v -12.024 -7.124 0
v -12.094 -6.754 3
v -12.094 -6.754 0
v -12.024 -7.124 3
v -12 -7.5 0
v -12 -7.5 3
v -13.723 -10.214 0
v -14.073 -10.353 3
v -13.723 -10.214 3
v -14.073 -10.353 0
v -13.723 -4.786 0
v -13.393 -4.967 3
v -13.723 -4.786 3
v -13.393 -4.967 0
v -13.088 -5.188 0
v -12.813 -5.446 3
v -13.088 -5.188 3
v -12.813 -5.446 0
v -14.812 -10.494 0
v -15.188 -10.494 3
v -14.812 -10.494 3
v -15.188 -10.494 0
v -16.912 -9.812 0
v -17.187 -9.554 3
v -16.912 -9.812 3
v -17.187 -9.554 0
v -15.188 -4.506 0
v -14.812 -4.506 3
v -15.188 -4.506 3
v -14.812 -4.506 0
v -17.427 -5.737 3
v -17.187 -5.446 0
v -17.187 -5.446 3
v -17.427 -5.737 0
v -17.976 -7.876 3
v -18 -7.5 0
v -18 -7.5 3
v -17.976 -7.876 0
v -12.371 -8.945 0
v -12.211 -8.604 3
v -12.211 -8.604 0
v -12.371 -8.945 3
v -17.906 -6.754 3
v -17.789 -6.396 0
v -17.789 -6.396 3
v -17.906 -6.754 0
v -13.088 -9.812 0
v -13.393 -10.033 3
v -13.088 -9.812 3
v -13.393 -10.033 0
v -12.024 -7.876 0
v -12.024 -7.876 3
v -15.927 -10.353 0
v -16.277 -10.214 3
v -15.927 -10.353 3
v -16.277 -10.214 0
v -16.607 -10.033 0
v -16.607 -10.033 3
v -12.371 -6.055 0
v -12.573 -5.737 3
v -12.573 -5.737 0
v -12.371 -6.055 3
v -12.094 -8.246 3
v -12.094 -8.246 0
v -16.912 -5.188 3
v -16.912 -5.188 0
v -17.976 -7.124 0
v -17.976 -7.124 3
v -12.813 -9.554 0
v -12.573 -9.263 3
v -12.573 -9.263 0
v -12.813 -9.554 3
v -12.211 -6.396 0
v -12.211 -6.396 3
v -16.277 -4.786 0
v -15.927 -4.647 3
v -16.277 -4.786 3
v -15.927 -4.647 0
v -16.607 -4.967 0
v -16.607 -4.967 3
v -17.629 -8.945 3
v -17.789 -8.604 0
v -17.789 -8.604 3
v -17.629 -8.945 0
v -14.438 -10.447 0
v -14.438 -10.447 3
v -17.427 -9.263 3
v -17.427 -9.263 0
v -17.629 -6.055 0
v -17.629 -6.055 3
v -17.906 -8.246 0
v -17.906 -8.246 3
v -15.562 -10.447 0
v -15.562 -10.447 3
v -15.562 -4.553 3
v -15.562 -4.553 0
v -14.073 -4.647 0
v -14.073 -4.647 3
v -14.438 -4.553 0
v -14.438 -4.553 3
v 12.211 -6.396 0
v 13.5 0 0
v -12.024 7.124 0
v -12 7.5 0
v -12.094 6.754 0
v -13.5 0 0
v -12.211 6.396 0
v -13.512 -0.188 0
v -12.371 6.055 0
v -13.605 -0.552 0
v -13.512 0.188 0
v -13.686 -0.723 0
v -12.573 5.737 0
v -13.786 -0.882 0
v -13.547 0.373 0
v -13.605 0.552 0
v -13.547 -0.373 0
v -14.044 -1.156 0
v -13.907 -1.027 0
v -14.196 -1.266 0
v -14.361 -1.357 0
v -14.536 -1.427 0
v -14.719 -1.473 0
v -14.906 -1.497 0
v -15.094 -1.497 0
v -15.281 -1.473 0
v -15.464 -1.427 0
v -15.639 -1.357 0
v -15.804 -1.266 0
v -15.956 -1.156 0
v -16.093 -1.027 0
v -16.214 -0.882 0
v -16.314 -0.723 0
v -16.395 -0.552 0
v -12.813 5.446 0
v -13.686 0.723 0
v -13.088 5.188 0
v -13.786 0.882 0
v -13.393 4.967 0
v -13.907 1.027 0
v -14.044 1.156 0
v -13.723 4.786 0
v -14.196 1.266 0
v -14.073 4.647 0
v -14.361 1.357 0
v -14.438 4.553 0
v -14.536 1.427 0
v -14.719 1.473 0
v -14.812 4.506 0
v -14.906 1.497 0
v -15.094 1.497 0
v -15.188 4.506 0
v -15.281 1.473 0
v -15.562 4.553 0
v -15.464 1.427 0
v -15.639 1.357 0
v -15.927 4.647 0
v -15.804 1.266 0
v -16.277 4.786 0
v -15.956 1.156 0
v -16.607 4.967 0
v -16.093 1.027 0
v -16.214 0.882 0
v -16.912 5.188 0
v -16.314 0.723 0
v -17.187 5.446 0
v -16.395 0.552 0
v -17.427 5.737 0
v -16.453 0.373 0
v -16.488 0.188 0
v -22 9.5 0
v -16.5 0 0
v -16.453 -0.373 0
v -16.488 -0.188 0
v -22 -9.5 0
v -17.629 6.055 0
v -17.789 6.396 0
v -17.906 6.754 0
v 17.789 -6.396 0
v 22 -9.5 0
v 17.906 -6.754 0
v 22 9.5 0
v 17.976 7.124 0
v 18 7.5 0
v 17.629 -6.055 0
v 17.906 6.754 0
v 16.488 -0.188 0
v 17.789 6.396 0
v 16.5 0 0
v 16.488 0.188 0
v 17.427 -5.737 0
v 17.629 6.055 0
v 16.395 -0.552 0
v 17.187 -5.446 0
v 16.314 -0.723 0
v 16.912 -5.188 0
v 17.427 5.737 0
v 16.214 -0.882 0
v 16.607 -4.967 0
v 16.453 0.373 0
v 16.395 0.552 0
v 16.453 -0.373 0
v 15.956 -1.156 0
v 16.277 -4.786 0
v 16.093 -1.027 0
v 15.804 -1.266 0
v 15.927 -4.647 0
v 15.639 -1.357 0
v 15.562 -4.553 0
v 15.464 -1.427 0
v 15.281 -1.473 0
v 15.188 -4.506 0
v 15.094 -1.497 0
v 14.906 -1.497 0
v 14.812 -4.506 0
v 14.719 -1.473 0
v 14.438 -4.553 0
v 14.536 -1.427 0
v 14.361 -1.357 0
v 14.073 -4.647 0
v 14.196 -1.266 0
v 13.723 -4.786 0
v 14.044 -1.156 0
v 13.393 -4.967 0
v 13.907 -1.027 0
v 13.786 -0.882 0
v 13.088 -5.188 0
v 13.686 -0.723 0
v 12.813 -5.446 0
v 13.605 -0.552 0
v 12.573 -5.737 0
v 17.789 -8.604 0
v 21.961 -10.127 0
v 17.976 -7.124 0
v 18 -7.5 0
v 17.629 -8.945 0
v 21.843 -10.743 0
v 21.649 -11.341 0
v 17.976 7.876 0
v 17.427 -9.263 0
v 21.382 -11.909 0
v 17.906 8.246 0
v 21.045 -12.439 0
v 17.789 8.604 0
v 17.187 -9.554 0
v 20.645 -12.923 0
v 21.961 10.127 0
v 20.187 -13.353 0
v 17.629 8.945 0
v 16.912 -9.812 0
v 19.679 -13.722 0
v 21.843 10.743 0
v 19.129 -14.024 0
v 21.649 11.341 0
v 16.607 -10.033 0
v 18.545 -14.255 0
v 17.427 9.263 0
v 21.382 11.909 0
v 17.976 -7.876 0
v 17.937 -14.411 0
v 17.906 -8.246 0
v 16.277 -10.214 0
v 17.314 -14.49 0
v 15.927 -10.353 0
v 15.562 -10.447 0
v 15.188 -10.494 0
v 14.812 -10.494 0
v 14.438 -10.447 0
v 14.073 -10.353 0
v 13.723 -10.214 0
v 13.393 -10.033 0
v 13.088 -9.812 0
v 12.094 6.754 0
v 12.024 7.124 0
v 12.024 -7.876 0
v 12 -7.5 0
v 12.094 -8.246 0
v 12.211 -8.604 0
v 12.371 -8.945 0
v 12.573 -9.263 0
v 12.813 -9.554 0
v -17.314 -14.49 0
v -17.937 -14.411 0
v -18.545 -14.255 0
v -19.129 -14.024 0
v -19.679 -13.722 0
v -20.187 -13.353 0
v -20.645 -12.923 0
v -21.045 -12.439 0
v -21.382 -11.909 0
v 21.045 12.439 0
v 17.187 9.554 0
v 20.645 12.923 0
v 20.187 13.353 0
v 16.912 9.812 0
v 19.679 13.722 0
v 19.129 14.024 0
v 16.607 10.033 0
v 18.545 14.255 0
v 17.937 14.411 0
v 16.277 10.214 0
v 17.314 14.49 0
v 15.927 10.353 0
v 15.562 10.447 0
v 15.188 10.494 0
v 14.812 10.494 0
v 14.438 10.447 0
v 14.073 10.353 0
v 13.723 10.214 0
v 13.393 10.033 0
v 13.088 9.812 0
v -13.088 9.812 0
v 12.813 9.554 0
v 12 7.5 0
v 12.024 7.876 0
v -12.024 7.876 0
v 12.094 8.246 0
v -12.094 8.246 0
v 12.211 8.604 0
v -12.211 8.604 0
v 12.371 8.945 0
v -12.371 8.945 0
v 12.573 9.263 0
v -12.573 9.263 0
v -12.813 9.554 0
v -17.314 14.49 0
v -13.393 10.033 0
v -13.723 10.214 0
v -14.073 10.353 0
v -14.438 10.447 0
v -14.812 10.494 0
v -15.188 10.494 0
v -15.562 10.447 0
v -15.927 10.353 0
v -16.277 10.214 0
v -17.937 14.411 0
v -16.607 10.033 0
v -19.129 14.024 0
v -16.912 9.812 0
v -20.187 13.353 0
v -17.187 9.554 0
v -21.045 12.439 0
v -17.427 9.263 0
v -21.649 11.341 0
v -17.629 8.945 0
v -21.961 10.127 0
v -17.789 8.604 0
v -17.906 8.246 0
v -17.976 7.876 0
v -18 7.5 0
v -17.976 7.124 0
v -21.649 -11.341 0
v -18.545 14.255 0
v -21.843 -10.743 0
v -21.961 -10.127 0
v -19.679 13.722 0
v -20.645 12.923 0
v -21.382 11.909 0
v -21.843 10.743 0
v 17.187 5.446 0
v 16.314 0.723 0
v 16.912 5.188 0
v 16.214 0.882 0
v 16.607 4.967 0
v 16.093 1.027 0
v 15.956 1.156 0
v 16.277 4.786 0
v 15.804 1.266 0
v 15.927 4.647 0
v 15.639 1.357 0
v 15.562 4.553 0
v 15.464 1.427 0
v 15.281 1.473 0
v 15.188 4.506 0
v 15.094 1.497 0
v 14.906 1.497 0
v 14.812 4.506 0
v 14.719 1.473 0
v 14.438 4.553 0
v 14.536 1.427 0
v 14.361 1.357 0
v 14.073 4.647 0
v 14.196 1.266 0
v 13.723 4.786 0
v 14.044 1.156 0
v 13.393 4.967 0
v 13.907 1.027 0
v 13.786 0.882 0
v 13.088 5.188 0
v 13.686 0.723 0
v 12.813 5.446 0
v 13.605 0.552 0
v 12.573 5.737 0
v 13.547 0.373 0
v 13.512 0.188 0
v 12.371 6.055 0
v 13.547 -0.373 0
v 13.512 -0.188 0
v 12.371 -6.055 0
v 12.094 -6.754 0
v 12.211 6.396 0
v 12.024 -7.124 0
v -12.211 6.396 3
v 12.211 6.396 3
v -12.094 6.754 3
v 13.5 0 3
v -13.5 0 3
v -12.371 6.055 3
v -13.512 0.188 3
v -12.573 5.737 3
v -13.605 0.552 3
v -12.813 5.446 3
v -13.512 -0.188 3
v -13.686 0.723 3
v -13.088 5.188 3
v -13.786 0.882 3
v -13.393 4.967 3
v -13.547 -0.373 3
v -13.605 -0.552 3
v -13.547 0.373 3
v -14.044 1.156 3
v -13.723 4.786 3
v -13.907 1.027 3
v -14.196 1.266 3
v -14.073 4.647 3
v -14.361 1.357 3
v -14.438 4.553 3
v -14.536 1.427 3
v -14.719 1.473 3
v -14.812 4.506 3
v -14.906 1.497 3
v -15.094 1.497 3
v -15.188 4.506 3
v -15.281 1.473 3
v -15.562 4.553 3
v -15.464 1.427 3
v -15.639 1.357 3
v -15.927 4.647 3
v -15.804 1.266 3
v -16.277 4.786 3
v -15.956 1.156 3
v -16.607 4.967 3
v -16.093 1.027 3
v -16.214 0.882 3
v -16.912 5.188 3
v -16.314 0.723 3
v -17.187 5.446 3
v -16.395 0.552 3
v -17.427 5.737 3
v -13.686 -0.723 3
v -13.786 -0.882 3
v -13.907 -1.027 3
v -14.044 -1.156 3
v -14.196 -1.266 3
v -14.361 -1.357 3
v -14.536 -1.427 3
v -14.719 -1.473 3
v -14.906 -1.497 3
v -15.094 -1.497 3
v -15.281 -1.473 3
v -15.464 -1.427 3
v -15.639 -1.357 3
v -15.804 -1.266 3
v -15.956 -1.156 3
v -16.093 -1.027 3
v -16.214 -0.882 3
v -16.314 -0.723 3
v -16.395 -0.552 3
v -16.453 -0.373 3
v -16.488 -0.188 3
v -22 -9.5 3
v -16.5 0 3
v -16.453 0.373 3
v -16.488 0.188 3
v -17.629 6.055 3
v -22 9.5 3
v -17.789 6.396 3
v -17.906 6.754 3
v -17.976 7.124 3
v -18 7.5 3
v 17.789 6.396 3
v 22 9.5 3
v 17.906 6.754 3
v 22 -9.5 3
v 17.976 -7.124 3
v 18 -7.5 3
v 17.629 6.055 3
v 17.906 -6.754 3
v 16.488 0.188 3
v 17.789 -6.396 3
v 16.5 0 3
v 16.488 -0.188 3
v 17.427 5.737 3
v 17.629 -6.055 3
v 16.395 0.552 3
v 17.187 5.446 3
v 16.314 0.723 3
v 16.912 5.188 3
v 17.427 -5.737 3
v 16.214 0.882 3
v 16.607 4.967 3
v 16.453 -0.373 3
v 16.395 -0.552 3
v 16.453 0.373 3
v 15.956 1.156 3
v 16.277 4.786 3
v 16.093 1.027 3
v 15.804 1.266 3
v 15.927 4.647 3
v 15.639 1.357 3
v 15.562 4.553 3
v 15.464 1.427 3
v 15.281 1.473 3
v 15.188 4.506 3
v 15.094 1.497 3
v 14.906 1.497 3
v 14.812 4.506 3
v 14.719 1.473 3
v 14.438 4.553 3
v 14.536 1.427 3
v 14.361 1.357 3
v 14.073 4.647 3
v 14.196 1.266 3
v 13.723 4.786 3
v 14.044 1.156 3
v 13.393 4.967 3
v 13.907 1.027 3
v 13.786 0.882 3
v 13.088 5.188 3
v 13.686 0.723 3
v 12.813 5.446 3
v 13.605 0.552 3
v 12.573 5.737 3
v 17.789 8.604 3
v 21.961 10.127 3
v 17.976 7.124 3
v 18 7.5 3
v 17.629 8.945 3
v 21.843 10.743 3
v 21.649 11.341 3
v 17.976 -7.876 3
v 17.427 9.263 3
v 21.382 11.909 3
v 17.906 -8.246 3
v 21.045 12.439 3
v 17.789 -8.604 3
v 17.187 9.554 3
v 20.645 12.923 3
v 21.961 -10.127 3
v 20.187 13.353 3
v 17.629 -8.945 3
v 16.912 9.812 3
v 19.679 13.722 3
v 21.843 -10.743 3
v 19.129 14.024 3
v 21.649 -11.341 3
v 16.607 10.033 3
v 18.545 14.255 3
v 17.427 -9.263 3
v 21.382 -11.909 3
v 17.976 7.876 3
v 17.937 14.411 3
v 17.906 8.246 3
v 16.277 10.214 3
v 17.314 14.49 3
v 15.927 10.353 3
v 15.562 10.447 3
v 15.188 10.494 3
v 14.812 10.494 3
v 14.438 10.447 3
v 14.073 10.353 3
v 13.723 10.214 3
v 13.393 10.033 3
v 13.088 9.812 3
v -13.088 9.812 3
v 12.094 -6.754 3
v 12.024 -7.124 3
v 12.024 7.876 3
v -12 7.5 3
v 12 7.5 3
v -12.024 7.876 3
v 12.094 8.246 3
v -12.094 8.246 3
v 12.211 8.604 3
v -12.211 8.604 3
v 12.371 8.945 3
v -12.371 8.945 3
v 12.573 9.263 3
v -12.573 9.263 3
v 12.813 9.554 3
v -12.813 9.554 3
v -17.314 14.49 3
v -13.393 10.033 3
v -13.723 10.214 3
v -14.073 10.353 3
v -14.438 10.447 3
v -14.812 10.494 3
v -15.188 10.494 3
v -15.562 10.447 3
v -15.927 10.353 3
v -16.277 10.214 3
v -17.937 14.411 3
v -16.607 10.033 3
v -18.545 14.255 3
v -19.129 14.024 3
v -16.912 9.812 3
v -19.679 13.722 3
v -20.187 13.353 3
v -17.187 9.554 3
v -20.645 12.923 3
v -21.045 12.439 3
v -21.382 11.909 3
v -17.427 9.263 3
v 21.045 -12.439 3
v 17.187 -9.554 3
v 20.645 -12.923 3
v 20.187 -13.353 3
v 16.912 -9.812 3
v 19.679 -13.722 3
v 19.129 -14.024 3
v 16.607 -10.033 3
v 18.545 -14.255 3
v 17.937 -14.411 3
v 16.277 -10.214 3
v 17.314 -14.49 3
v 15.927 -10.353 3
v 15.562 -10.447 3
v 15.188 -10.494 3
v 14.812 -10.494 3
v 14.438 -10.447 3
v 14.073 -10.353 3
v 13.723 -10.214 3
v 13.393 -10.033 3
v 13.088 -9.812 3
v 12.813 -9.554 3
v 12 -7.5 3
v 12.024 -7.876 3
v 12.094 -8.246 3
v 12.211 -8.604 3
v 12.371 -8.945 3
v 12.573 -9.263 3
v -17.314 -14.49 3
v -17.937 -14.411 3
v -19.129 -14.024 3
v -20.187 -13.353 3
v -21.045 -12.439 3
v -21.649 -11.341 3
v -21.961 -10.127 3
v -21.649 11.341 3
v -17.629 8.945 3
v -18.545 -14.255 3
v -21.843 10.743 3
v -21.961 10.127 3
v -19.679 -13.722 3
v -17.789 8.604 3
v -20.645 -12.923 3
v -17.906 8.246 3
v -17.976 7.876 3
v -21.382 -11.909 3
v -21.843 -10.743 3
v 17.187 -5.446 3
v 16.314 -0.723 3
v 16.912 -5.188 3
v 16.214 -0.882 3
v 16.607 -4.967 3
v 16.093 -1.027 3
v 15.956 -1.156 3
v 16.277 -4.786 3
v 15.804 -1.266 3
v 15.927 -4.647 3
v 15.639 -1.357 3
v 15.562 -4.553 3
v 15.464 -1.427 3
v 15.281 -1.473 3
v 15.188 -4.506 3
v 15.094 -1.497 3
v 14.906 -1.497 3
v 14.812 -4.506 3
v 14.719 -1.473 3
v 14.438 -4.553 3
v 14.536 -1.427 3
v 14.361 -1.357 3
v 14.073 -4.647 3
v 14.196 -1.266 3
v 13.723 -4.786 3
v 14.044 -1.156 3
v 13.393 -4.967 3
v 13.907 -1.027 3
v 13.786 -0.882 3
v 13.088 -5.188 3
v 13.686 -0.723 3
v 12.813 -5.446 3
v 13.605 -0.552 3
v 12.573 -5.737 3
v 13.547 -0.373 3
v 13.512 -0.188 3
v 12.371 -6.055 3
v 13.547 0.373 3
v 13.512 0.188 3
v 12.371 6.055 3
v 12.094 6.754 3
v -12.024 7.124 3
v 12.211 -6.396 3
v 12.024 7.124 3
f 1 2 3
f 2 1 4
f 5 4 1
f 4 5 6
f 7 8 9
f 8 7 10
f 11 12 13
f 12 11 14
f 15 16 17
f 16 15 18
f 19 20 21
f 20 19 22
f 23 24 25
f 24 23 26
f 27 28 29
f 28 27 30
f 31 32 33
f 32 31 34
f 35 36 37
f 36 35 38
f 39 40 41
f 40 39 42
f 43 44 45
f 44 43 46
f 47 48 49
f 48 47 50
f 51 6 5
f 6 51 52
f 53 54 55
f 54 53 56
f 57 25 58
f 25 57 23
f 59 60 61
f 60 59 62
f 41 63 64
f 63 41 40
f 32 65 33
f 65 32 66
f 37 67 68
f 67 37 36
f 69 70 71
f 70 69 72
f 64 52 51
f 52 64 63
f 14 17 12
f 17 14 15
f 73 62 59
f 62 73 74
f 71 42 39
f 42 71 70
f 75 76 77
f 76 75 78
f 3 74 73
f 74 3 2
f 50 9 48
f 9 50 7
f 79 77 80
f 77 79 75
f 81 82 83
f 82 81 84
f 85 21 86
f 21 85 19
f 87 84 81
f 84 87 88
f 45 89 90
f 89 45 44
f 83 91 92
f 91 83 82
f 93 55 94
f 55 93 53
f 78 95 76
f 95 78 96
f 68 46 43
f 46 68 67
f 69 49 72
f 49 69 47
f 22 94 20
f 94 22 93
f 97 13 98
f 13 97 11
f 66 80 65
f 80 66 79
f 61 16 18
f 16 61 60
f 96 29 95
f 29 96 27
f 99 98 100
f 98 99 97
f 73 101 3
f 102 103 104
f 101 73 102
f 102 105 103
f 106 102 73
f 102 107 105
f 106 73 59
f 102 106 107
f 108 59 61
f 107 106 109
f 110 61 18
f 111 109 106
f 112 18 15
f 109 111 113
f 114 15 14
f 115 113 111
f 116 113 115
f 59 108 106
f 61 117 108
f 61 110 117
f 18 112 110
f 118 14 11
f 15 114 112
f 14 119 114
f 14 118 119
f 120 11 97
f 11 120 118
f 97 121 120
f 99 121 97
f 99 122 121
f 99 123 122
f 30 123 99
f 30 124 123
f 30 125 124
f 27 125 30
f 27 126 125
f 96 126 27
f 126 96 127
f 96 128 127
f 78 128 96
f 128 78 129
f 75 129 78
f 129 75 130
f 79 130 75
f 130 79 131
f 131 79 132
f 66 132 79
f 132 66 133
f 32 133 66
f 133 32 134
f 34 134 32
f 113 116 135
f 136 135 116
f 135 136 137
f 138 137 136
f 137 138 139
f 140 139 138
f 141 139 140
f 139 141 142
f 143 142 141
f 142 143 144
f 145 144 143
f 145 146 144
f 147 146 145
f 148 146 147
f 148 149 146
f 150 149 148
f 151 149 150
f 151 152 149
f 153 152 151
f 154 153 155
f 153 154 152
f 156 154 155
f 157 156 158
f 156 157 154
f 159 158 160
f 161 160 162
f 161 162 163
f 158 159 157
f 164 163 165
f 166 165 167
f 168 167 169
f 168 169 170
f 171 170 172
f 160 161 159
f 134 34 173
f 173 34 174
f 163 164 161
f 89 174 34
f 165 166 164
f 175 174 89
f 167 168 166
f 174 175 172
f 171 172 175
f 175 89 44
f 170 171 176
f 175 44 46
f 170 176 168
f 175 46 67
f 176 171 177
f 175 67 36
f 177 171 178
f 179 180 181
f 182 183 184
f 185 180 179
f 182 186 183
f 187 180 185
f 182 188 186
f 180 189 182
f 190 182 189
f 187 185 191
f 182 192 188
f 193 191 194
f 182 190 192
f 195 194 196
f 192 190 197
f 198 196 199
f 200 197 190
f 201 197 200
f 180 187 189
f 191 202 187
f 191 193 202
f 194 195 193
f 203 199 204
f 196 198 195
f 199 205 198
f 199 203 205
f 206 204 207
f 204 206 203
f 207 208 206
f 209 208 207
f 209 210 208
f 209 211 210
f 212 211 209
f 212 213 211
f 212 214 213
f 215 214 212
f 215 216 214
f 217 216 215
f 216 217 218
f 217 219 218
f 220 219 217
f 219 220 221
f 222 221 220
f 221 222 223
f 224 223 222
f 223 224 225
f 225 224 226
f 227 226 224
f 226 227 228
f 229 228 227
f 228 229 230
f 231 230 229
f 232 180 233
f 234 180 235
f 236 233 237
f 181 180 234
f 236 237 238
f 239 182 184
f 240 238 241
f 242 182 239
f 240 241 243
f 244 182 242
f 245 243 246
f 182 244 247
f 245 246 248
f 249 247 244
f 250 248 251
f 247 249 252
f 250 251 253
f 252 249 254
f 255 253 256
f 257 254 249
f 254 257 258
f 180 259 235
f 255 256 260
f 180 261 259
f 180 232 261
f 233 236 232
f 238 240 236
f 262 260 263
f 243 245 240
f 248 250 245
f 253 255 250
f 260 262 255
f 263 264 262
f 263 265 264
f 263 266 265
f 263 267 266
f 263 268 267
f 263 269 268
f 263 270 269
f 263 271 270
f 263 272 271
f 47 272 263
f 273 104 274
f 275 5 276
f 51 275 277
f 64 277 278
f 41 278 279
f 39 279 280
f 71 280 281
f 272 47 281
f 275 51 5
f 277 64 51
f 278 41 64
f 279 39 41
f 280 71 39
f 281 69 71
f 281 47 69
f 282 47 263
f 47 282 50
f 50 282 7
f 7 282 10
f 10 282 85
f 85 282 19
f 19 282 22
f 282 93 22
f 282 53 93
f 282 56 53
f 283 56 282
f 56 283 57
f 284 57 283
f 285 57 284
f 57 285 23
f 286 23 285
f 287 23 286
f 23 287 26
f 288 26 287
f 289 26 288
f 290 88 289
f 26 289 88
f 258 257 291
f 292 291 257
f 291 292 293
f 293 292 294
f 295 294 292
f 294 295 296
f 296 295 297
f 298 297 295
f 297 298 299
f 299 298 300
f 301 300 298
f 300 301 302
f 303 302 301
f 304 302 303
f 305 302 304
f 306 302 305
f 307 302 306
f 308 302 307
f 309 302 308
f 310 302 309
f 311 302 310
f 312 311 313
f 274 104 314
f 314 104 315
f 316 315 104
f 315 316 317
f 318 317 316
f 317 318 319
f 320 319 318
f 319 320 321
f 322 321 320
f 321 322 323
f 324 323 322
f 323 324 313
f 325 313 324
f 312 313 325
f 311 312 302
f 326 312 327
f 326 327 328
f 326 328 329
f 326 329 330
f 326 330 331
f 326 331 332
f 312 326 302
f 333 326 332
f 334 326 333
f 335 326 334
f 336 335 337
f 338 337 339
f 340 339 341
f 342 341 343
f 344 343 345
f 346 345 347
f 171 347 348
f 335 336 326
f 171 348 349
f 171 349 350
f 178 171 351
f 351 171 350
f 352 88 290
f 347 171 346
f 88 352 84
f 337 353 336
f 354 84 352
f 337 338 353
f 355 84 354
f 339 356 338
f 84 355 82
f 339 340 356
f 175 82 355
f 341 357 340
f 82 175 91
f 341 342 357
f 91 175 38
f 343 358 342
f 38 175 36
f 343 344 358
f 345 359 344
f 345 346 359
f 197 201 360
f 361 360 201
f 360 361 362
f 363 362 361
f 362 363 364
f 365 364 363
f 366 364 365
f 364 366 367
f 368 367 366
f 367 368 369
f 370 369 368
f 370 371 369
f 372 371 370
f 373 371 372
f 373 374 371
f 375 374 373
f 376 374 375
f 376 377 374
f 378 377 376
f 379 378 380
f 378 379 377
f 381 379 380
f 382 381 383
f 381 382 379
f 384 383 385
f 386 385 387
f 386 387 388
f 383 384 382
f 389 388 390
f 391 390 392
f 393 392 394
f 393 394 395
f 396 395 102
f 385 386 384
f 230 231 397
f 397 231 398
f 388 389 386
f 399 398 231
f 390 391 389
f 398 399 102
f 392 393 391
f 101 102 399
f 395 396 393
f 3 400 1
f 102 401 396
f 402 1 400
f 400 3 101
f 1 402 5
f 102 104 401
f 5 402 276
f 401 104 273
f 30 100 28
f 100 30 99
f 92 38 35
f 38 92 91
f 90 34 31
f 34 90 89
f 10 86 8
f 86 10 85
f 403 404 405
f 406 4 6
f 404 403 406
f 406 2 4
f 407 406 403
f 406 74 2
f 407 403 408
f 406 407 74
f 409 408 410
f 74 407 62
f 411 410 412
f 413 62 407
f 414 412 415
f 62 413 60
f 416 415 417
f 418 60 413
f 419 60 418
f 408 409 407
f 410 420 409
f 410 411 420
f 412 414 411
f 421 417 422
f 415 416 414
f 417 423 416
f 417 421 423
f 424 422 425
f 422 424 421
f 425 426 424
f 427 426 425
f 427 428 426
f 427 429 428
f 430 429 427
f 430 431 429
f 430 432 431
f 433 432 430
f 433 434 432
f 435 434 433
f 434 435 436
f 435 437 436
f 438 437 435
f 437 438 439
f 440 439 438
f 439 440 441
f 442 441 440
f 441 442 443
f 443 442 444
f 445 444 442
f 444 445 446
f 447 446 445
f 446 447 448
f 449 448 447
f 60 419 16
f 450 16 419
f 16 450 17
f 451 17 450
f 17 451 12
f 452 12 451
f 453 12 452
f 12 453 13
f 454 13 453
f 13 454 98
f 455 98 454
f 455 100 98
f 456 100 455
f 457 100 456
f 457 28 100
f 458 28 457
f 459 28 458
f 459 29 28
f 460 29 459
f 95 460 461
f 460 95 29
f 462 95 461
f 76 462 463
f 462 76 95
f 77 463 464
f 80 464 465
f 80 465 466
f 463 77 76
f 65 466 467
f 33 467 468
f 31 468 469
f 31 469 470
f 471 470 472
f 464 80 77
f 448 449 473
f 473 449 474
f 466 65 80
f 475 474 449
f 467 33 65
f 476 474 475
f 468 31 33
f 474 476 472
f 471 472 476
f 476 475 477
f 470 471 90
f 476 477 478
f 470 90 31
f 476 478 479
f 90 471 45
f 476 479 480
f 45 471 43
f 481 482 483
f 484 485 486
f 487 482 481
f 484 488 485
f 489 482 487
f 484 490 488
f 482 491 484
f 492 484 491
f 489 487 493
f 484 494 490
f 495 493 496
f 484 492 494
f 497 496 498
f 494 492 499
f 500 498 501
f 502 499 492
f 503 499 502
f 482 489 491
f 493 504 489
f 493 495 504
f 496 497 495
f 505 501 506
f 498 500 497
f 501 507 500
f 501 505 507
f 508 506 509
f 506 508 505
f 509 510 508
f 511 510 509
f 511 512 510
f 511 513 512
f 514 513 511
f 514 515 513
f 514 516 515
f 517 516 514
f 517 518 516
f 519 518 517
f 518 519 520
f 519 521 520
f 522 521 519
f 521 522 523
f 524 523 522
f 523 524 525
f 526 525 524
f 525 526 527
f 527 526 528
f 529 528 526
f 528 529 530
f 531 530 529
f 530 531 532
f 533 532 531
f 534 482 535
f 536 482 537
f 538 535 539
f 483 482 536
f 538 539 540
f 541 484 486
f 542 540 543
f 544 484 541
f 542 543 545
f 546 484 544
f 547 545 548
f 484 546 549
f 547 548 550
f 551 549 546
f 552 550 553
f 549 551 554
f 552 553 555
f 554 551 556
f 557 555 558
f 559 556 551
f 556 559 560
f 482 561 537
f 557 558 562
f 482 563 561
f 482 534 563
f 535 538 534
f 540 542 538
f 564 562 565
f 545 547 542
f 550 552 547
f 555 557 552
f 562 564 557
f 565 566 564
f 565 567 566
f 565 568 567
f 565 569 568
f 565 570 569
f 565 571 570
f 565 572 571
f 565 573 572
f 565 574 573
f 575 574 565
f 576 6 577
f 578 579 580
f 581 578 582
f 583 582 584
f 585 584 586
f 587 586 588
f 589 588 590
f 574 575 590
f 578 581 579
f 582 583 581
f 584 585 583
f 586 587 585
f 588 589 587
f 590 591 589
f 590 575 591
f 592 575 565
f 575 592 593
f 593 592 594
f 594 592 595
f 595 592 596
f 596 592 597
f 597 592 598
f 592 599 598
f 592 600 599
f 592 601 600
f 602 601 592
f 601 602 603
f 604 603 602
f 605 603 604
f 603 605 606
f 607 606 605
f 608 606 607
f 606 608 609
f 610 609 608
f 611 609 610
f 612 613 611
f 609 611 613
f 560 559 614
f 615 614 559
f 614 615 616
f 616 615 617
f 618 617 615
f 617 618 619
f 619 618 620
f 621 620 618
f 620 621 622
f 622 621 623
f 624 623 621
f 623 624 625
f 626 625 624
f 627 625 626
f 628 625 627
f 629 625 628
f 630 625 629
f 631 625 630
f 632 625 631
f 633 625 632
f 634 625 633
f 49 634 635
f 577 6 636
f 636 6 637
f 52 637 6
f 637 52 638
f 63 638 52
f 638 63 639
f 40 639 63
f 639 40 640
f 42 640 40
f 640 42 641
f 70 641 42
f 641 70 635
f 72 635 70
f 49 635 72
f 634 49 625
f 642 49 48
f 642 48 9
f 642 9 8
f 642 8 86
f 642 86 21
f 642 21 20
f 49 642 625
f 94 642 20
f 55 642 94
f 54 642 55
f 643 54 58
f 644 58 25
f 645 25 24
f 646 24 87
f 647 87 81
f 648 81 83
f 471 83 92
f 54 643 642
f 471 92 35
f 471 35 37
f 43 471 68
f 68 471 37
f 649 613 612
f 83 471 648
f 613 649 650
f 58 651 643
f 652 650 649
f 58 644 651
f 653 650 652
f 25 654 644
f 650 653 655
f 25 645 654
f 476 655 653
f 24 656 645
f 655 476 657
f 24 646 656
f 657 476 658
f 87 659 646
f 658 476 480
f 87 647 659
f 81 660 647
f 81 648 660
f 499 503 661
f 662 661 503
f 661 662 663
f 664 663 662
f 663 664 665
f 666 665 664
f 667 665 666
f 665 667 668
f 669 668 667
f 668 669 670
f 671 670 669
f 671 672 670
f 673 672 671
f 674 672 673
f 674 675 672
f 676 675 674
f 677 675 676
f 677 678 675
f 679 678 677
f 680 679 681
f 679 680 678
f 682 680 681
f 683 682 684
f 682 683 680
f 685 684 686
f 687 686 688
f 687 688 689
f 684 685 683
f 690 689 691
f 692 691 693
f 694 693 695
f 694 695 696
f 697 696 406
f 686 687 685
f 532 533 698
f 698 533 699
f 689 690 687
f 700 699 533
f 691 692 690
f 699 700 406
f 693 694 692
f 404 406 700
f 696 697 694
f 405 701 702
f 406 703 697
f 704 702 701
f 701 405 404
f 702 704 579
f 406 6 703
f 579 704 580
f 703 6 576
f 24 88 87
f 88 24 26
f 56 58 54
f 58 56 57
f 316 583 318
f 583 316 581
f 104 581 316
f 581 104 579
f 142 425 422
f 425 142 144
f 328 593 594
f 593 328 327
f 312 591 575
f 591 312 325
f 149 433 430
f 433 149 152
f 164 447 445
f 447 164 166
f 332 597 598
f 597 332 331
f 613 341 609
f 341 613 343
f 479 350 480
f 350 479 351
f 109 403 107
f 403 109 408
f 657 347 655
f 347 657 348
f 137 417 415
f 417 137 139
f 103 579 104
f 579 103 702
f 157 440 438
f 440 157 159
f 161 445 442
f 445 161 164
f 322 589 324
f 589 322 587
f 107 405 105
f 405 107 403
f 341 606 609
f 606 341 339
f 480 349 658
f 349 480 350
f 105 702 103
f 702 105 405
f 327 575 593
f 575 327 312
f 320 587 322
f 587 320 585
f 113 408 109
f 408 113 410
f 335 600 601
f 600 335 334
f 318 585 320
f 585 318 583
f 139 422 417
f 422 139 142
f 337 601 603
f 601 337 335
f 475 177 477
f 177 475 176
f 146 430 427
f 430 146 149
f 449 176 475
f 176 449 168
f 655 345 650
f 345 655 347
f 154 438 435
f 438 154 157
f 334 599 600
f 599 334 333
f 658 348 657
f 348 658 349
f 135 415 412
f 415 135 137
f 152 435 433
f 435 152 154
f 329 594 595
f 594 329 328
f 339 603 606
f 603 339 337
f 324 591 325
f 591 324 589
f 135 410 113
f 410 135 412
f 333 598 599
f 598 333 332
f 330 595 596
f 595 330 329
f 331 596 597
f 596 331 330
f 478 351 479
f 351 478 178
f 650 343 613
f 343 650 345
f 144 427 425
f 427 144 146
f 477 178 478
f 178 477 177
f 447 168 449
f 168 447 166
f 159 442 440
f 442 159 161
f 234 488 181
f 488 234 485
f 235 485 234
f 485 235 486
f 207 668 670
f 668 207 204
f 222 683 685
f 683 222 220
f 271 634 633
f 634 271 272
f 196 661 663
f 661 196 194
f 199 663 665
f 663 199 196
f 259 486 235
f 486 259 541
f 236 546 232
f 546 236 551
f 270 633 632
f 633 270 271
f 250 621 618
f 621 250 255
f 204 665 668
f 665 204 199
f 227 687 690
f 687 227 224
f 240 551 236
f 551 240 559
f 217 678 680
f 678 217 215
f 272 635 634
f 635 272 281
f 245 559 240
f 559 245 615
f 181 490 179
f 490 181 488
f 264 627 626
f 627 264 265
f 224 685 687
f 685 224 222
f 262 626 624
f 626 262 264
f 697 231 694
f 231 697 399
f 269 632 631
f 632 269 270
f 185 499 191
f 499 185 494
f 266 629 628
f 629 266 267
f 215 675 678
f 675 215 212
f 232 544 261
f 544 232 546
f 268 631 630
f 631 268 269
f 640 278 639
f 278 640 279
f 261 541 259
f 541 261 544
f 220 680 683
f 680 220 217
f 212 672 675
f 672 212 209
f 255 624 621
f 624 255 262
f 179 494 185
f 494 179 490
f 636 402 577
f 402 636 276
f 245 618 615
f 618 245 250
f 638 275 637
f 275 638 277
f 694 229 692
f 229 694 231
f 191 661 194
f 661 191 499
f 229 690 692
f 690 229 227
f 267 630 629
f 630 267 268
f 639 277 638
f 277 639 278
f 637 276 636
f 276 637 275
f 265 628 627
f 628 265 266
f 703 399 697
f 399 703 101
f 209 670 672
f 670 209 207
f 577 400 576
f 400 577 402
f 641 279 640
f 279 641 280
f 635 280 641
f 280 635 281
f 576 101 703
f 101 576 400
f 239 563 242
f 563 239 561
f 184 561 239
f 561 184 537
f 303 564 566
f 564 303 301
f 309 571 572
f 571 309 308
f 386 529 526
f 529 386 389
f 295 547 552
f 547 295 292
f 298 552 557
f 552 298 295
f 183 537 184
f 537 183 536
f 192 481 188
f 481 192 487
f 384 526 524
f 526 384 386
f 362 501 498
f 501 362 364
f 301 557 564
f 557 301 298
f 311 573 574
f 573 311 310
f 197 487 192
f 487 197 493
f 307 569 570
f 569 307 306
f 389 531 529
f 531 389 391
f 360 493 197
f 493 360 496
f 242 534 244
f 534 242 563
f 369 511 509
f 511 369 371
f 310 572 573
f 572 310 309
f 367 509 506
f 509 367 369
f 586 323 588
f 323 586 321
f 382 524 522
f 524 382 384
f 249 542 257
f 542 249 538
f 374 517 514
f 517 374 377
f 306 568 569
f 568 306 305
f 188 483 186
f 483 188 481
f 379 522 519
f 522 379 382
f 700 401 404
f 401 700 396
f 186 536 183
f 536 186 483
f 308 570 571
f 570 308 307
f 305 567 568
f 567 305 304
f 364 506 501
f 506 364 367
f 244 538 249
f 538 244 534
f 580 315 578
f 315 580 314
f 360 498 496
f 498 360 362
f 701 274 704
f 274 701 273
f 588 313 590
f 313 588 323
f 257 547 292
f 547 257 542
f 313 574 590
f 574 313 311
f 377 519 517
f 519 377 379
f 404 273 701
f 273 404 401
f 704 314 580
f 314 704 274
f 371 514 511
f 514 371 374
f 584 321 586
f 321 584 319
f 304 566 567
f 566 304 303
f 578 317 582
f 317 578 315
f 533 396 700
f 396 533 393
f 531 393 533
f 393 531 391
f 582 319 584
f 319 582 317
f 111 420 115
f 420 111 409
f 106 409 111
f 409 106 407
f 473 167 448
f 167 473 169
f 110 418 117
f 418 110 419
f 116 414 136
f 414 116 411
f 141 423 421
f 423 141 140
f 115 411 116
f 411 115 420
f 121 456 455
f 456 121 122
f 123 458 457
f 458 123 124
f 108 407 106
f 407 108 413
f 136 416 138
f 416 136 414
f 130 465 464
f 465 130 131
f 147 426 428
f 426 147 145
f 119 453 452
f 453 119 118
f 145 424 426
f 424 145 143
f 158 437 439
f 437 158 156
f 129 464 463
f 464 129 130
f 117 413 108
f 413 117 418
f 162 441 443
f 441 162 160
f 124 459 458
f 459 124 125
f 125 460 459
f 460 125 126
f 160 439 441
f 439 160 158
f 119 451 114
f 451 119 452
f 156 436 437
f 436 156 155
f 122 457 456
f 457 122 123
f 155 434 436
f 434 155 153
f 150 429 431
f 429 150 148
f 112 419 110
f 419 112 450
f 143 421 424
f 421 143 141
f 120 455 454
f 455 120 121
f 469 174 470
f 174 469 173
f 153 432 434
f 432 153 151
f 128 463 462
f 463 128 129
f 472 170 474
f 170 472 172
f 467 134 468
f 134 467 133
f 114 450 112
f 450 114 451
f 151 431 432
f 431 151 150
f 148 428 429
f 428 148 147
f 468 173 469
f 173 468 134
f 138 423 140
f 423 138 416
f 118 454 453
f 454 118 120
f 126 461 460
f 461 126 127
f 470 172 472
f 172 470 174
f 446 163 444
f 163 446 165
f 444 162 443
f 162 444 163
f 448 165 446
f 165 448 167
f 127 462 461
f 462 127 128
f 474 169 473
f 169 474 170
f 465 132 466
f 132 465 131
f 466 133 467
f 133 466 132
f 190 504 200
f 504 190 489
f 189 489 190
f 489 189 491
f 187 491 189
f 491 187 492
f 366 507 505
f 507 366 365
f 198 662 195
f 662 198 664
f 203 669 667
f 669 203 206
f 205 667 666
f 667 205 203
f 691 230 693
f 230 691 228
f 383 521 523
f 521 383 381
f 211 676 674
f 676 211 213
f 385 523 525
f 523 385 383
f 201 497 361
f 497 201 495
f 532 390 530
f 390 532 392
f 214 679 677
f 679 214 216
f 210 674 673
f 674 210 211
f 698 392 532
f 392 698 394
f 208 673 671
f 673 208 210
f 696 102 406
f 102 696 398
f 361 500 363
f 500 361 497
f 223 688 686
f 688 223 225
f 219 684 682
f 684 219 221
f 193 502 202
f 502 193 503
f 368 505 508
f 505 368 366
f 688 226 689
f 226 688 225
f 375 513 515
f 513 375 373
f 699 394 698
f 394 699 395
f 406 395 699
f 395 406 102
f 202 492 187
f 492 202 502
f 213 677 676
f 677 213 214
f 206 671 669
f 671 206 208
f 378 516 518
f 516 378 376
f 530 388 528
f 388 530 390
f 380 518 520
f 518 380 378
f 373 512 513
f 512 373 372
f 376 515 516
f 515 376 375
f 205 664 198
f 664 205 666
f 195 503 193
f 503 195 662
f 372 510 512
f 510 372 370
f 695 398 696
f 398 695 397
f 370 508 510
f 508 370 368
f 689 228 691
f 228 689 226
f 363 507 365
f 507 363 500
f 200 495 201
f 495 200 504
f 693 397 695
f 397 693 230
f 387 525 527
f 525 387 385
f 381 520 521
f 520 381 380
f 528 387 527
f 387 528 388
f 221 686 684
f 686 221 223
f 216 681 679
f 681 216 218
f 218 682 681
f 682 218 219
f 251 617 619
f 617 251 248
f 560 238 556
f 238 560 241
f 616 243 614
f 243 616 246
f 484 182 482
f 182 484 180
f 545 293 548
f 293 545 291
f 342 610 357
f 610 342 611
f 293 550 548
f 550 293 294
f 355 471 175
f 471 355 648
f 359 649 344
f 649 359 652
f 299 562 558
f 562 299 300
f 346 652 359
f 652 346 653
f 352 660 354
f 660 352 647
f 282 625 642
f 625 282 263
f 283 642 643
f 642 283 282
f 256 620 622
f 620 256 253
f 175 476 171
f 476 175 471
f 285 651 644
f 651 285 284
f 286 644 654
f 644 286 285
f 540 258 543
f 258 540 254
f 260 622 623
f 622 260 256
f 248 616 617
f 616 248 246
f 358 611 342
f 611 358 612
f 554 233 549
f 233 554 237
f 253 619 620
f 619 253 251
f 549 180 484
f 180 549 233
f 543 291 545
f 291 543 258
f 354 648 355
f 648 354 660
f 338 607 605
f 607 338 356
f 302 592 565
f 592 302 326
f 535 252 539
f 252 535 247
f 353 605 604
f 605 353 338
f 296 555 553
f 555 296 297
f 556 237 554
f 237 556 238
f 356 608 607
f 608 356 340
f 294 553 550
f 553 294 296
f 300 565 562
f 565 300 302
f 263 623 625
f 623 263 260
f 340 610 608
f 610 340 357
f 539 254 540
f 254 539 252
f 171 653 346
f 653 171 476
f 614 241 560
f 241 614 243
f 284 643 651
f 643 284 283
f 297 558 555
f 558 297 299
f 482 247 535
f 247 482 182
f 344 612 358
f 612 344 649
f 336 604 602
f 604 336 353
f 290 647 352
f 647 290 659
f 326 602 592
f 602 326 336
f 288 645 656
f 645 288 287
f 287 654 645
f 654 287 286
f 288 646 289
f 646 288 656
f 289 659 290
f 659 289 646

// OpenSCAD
$fn = 50;


difference() {
	union() {
		hull() {
			translate(v = [-17.0000000000, 9.5000000000, 0]) {
				cylinder(h = 3, r = 5);
			}
			translate(v = [17.0000000000, 9.5000000000, 0]) {
				cylinder(h = 3, r = 5);
			}
			translate(v = [-17.0000000000, -9.5000000000, 0]) {
				cylinder(h = 3, r = 5);
			}
			translate(v = [17.0000000000, -9.5000000000, 0]) {
				cylinder(h = 3, r = 5);
			}
		}
	}
	union() {
		translate(v = [-15.0000000000, -7.5000000000, 0]) {
			cylinder(h = 3, r = 3.0000000000);
		}
		translate(v = [-15.0000000000, 7.5000000000, 0]) {
			cylinder(h = 3, r = 3.0000000000);
		}
		translate(v = [15.0000000000, -7.5000000000, 0]) {
			cylinder(h = 3, r = 3.0000000000);
		}
		translate(v = [15.0000000000, 7.5000000000, 0]) {
			cylinder(h = 3, r = 3.0000000000);
		}
		translate(v = [-15.0000000000, -7.5000000000, 0]) {
			cylinder(h = 3, r = 1.5000000000);
		}
		translate(v = [-15.0000000000, 0.0000000000, 0]) {
			cylinder(h = 3, r = 1.5000000000);
		}
		translate(v = [-15.0000000000, 7.5000000000, 0]) {
			cylinder(h = 3, r = 1.5000000000);
		}
		translate(v = [15.0000000000, -7.5000000000, 0]) {
			cylinder(h = 3, r = 1.5000000000);
		}
		translate(v = [15.0000000000, 0.0000000000, 0]) {
			cylinder(h = 3, r = 1.5000000000);
		}
		translate(v = [15.0000000000, 7.5000000000, 0]) {
			cylinder(h = 3, r = 1.5000000000);
		}
		translate(v = [-15.0000000000, -7.5000000000, 0]) {
			cylinder(h = 3, r = 1.5000000000);
		}
		translate(v = [-15.0000000000, 0.0000000000, 0]) {
			cylinder(h = 3, r = 1.5000000000);
		}
		translate(v = [-15.0000000000, 7.5000000000, 0]) {
			cylinder(h = 3, r = 1.5000000000);
		}
		translate(v = [15.0000000000, -7.5000000000, 0]) {
			cylinder(h = 3, r = 1.5000000000);
		}
		translate(v = [15.0000000000, 0.0000000000, 0]) {
			cylinder(h = 3, r = 1.5000000000);
		}
		translate(v = [15.0000000000, 7.5000000000, 0]) {
			cylinder(h = 3, r = 1.5000000000);
		}
		translate(v = [-15.0000000000, -7.5000000000, 0]) {
			cylinder(h = 3, r = 1.5000000000);
		}
		translate(v = [-15.0000000000, 0.0000000000, 0]) {
			cylinder(h = 3, r = 1.5000000000);
		}
		translate(v = [-15.0000000000, 7.5000000000, 0]) {
			cylinder(h = 3, r = 1.5000000000);
		}
		translate(v = [15.0000000000, -7.5000000000, 0]) {
			cylinder(h = 3, r = 1.5000000000);
		}
		translate(v = [15.0000000000, 0.0000000000, 0]) {
			cylinder(h = 3, r = 1.5000000000);
		}
		translate(v = [15.0000000000, 7.5000000000, 0]) {
			cylinder(h = 3, r = 1.5000000000);
		}
	}
}
